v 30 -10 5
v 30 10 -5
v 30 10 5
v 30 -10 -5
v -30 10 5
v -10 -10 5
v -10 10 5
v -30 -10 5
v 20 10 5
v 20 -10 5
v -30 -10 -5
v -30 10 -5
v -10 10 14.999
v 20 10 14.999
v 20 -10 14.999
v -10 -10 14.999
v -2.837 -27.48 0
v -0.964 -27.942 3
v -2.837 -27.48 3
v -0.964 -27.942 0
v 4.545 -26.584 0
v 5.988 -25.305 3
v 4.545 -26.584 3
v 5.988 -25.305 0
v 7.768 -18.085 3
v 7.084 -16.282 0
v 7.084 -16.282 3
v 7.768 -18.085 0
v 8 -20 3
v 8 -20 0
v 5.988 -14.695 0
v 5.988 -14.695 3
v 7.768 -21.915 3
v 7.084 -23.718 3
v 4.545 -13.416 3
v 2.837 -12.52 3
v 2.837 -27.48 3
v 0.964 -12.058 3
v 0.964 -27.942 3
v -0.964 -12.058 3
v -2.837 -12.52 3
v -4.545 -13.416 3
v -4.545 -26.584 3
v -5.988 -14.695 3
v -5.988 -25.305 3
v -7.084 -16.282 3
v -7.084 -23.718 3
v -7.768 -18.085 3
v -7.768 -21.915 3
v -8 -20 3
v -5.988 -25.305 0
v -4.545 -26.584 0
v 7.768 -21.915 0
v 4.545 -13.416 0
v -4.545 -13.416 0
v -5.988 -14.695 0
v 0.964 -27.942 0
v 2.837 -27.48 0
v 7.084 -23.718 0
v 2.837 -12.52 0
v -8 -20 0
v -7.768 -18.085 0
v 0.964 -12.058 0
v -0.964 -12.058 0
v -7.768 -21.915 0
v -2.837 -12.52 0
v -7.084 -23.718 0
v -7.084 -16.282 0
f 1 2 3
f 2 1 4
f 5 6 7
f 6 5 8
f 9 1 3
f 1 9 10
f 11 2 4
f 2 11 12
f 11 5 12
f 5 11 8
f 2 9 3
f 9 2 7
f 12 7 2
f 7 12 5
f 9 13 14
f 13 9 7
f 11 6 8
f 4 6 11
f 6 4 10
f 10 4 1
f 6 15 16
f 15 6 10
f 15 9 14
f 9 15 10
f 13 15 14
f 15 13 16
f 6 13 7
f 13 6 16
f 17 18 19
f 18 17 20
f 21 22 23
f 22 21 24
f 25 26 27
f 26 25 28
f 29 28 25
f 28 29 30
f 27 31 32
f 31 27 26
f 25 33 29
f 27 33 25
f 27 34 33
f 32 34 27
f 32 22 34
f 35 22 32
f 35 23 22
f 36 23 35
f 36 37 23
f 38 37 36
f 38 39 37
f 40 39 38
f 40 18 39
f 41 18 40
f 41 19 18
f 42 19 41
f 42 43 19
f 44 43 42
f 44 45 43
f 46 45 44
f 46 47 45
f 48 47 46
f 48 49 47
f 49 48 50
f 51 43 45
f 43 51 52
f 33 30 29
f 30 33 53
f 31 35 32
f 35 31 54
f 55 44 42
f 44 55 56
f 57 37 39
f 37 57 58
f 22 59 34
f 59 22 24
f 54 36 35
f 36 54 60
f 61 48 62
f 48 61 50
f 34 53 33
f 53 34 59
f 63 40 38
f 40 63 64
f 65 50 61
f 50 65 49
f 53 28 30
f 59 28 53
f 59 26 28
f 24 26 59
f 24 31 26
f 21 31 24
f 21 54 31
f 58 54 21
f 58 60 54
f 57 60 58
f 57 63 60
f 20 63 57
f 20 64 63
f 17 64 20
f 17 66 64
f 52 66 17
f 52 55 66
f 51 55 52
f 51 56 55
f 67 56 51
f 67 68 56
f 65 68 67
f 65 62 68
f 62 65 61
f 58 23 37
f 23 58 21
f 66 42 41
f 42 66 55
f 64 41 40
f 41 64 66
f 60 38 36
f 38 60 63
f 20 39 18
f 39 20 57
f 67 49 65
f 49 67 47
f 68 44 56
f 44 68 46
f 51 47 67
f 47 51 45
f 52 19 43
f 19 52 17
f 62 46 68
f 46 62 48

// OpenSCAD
cube([60,20,10],center=true);
translate([5,0,10 - 0.001])
    cube([30,20,10],center=true);
translate([0,-20,0])
    cylinder(h=3,r=8);
    
